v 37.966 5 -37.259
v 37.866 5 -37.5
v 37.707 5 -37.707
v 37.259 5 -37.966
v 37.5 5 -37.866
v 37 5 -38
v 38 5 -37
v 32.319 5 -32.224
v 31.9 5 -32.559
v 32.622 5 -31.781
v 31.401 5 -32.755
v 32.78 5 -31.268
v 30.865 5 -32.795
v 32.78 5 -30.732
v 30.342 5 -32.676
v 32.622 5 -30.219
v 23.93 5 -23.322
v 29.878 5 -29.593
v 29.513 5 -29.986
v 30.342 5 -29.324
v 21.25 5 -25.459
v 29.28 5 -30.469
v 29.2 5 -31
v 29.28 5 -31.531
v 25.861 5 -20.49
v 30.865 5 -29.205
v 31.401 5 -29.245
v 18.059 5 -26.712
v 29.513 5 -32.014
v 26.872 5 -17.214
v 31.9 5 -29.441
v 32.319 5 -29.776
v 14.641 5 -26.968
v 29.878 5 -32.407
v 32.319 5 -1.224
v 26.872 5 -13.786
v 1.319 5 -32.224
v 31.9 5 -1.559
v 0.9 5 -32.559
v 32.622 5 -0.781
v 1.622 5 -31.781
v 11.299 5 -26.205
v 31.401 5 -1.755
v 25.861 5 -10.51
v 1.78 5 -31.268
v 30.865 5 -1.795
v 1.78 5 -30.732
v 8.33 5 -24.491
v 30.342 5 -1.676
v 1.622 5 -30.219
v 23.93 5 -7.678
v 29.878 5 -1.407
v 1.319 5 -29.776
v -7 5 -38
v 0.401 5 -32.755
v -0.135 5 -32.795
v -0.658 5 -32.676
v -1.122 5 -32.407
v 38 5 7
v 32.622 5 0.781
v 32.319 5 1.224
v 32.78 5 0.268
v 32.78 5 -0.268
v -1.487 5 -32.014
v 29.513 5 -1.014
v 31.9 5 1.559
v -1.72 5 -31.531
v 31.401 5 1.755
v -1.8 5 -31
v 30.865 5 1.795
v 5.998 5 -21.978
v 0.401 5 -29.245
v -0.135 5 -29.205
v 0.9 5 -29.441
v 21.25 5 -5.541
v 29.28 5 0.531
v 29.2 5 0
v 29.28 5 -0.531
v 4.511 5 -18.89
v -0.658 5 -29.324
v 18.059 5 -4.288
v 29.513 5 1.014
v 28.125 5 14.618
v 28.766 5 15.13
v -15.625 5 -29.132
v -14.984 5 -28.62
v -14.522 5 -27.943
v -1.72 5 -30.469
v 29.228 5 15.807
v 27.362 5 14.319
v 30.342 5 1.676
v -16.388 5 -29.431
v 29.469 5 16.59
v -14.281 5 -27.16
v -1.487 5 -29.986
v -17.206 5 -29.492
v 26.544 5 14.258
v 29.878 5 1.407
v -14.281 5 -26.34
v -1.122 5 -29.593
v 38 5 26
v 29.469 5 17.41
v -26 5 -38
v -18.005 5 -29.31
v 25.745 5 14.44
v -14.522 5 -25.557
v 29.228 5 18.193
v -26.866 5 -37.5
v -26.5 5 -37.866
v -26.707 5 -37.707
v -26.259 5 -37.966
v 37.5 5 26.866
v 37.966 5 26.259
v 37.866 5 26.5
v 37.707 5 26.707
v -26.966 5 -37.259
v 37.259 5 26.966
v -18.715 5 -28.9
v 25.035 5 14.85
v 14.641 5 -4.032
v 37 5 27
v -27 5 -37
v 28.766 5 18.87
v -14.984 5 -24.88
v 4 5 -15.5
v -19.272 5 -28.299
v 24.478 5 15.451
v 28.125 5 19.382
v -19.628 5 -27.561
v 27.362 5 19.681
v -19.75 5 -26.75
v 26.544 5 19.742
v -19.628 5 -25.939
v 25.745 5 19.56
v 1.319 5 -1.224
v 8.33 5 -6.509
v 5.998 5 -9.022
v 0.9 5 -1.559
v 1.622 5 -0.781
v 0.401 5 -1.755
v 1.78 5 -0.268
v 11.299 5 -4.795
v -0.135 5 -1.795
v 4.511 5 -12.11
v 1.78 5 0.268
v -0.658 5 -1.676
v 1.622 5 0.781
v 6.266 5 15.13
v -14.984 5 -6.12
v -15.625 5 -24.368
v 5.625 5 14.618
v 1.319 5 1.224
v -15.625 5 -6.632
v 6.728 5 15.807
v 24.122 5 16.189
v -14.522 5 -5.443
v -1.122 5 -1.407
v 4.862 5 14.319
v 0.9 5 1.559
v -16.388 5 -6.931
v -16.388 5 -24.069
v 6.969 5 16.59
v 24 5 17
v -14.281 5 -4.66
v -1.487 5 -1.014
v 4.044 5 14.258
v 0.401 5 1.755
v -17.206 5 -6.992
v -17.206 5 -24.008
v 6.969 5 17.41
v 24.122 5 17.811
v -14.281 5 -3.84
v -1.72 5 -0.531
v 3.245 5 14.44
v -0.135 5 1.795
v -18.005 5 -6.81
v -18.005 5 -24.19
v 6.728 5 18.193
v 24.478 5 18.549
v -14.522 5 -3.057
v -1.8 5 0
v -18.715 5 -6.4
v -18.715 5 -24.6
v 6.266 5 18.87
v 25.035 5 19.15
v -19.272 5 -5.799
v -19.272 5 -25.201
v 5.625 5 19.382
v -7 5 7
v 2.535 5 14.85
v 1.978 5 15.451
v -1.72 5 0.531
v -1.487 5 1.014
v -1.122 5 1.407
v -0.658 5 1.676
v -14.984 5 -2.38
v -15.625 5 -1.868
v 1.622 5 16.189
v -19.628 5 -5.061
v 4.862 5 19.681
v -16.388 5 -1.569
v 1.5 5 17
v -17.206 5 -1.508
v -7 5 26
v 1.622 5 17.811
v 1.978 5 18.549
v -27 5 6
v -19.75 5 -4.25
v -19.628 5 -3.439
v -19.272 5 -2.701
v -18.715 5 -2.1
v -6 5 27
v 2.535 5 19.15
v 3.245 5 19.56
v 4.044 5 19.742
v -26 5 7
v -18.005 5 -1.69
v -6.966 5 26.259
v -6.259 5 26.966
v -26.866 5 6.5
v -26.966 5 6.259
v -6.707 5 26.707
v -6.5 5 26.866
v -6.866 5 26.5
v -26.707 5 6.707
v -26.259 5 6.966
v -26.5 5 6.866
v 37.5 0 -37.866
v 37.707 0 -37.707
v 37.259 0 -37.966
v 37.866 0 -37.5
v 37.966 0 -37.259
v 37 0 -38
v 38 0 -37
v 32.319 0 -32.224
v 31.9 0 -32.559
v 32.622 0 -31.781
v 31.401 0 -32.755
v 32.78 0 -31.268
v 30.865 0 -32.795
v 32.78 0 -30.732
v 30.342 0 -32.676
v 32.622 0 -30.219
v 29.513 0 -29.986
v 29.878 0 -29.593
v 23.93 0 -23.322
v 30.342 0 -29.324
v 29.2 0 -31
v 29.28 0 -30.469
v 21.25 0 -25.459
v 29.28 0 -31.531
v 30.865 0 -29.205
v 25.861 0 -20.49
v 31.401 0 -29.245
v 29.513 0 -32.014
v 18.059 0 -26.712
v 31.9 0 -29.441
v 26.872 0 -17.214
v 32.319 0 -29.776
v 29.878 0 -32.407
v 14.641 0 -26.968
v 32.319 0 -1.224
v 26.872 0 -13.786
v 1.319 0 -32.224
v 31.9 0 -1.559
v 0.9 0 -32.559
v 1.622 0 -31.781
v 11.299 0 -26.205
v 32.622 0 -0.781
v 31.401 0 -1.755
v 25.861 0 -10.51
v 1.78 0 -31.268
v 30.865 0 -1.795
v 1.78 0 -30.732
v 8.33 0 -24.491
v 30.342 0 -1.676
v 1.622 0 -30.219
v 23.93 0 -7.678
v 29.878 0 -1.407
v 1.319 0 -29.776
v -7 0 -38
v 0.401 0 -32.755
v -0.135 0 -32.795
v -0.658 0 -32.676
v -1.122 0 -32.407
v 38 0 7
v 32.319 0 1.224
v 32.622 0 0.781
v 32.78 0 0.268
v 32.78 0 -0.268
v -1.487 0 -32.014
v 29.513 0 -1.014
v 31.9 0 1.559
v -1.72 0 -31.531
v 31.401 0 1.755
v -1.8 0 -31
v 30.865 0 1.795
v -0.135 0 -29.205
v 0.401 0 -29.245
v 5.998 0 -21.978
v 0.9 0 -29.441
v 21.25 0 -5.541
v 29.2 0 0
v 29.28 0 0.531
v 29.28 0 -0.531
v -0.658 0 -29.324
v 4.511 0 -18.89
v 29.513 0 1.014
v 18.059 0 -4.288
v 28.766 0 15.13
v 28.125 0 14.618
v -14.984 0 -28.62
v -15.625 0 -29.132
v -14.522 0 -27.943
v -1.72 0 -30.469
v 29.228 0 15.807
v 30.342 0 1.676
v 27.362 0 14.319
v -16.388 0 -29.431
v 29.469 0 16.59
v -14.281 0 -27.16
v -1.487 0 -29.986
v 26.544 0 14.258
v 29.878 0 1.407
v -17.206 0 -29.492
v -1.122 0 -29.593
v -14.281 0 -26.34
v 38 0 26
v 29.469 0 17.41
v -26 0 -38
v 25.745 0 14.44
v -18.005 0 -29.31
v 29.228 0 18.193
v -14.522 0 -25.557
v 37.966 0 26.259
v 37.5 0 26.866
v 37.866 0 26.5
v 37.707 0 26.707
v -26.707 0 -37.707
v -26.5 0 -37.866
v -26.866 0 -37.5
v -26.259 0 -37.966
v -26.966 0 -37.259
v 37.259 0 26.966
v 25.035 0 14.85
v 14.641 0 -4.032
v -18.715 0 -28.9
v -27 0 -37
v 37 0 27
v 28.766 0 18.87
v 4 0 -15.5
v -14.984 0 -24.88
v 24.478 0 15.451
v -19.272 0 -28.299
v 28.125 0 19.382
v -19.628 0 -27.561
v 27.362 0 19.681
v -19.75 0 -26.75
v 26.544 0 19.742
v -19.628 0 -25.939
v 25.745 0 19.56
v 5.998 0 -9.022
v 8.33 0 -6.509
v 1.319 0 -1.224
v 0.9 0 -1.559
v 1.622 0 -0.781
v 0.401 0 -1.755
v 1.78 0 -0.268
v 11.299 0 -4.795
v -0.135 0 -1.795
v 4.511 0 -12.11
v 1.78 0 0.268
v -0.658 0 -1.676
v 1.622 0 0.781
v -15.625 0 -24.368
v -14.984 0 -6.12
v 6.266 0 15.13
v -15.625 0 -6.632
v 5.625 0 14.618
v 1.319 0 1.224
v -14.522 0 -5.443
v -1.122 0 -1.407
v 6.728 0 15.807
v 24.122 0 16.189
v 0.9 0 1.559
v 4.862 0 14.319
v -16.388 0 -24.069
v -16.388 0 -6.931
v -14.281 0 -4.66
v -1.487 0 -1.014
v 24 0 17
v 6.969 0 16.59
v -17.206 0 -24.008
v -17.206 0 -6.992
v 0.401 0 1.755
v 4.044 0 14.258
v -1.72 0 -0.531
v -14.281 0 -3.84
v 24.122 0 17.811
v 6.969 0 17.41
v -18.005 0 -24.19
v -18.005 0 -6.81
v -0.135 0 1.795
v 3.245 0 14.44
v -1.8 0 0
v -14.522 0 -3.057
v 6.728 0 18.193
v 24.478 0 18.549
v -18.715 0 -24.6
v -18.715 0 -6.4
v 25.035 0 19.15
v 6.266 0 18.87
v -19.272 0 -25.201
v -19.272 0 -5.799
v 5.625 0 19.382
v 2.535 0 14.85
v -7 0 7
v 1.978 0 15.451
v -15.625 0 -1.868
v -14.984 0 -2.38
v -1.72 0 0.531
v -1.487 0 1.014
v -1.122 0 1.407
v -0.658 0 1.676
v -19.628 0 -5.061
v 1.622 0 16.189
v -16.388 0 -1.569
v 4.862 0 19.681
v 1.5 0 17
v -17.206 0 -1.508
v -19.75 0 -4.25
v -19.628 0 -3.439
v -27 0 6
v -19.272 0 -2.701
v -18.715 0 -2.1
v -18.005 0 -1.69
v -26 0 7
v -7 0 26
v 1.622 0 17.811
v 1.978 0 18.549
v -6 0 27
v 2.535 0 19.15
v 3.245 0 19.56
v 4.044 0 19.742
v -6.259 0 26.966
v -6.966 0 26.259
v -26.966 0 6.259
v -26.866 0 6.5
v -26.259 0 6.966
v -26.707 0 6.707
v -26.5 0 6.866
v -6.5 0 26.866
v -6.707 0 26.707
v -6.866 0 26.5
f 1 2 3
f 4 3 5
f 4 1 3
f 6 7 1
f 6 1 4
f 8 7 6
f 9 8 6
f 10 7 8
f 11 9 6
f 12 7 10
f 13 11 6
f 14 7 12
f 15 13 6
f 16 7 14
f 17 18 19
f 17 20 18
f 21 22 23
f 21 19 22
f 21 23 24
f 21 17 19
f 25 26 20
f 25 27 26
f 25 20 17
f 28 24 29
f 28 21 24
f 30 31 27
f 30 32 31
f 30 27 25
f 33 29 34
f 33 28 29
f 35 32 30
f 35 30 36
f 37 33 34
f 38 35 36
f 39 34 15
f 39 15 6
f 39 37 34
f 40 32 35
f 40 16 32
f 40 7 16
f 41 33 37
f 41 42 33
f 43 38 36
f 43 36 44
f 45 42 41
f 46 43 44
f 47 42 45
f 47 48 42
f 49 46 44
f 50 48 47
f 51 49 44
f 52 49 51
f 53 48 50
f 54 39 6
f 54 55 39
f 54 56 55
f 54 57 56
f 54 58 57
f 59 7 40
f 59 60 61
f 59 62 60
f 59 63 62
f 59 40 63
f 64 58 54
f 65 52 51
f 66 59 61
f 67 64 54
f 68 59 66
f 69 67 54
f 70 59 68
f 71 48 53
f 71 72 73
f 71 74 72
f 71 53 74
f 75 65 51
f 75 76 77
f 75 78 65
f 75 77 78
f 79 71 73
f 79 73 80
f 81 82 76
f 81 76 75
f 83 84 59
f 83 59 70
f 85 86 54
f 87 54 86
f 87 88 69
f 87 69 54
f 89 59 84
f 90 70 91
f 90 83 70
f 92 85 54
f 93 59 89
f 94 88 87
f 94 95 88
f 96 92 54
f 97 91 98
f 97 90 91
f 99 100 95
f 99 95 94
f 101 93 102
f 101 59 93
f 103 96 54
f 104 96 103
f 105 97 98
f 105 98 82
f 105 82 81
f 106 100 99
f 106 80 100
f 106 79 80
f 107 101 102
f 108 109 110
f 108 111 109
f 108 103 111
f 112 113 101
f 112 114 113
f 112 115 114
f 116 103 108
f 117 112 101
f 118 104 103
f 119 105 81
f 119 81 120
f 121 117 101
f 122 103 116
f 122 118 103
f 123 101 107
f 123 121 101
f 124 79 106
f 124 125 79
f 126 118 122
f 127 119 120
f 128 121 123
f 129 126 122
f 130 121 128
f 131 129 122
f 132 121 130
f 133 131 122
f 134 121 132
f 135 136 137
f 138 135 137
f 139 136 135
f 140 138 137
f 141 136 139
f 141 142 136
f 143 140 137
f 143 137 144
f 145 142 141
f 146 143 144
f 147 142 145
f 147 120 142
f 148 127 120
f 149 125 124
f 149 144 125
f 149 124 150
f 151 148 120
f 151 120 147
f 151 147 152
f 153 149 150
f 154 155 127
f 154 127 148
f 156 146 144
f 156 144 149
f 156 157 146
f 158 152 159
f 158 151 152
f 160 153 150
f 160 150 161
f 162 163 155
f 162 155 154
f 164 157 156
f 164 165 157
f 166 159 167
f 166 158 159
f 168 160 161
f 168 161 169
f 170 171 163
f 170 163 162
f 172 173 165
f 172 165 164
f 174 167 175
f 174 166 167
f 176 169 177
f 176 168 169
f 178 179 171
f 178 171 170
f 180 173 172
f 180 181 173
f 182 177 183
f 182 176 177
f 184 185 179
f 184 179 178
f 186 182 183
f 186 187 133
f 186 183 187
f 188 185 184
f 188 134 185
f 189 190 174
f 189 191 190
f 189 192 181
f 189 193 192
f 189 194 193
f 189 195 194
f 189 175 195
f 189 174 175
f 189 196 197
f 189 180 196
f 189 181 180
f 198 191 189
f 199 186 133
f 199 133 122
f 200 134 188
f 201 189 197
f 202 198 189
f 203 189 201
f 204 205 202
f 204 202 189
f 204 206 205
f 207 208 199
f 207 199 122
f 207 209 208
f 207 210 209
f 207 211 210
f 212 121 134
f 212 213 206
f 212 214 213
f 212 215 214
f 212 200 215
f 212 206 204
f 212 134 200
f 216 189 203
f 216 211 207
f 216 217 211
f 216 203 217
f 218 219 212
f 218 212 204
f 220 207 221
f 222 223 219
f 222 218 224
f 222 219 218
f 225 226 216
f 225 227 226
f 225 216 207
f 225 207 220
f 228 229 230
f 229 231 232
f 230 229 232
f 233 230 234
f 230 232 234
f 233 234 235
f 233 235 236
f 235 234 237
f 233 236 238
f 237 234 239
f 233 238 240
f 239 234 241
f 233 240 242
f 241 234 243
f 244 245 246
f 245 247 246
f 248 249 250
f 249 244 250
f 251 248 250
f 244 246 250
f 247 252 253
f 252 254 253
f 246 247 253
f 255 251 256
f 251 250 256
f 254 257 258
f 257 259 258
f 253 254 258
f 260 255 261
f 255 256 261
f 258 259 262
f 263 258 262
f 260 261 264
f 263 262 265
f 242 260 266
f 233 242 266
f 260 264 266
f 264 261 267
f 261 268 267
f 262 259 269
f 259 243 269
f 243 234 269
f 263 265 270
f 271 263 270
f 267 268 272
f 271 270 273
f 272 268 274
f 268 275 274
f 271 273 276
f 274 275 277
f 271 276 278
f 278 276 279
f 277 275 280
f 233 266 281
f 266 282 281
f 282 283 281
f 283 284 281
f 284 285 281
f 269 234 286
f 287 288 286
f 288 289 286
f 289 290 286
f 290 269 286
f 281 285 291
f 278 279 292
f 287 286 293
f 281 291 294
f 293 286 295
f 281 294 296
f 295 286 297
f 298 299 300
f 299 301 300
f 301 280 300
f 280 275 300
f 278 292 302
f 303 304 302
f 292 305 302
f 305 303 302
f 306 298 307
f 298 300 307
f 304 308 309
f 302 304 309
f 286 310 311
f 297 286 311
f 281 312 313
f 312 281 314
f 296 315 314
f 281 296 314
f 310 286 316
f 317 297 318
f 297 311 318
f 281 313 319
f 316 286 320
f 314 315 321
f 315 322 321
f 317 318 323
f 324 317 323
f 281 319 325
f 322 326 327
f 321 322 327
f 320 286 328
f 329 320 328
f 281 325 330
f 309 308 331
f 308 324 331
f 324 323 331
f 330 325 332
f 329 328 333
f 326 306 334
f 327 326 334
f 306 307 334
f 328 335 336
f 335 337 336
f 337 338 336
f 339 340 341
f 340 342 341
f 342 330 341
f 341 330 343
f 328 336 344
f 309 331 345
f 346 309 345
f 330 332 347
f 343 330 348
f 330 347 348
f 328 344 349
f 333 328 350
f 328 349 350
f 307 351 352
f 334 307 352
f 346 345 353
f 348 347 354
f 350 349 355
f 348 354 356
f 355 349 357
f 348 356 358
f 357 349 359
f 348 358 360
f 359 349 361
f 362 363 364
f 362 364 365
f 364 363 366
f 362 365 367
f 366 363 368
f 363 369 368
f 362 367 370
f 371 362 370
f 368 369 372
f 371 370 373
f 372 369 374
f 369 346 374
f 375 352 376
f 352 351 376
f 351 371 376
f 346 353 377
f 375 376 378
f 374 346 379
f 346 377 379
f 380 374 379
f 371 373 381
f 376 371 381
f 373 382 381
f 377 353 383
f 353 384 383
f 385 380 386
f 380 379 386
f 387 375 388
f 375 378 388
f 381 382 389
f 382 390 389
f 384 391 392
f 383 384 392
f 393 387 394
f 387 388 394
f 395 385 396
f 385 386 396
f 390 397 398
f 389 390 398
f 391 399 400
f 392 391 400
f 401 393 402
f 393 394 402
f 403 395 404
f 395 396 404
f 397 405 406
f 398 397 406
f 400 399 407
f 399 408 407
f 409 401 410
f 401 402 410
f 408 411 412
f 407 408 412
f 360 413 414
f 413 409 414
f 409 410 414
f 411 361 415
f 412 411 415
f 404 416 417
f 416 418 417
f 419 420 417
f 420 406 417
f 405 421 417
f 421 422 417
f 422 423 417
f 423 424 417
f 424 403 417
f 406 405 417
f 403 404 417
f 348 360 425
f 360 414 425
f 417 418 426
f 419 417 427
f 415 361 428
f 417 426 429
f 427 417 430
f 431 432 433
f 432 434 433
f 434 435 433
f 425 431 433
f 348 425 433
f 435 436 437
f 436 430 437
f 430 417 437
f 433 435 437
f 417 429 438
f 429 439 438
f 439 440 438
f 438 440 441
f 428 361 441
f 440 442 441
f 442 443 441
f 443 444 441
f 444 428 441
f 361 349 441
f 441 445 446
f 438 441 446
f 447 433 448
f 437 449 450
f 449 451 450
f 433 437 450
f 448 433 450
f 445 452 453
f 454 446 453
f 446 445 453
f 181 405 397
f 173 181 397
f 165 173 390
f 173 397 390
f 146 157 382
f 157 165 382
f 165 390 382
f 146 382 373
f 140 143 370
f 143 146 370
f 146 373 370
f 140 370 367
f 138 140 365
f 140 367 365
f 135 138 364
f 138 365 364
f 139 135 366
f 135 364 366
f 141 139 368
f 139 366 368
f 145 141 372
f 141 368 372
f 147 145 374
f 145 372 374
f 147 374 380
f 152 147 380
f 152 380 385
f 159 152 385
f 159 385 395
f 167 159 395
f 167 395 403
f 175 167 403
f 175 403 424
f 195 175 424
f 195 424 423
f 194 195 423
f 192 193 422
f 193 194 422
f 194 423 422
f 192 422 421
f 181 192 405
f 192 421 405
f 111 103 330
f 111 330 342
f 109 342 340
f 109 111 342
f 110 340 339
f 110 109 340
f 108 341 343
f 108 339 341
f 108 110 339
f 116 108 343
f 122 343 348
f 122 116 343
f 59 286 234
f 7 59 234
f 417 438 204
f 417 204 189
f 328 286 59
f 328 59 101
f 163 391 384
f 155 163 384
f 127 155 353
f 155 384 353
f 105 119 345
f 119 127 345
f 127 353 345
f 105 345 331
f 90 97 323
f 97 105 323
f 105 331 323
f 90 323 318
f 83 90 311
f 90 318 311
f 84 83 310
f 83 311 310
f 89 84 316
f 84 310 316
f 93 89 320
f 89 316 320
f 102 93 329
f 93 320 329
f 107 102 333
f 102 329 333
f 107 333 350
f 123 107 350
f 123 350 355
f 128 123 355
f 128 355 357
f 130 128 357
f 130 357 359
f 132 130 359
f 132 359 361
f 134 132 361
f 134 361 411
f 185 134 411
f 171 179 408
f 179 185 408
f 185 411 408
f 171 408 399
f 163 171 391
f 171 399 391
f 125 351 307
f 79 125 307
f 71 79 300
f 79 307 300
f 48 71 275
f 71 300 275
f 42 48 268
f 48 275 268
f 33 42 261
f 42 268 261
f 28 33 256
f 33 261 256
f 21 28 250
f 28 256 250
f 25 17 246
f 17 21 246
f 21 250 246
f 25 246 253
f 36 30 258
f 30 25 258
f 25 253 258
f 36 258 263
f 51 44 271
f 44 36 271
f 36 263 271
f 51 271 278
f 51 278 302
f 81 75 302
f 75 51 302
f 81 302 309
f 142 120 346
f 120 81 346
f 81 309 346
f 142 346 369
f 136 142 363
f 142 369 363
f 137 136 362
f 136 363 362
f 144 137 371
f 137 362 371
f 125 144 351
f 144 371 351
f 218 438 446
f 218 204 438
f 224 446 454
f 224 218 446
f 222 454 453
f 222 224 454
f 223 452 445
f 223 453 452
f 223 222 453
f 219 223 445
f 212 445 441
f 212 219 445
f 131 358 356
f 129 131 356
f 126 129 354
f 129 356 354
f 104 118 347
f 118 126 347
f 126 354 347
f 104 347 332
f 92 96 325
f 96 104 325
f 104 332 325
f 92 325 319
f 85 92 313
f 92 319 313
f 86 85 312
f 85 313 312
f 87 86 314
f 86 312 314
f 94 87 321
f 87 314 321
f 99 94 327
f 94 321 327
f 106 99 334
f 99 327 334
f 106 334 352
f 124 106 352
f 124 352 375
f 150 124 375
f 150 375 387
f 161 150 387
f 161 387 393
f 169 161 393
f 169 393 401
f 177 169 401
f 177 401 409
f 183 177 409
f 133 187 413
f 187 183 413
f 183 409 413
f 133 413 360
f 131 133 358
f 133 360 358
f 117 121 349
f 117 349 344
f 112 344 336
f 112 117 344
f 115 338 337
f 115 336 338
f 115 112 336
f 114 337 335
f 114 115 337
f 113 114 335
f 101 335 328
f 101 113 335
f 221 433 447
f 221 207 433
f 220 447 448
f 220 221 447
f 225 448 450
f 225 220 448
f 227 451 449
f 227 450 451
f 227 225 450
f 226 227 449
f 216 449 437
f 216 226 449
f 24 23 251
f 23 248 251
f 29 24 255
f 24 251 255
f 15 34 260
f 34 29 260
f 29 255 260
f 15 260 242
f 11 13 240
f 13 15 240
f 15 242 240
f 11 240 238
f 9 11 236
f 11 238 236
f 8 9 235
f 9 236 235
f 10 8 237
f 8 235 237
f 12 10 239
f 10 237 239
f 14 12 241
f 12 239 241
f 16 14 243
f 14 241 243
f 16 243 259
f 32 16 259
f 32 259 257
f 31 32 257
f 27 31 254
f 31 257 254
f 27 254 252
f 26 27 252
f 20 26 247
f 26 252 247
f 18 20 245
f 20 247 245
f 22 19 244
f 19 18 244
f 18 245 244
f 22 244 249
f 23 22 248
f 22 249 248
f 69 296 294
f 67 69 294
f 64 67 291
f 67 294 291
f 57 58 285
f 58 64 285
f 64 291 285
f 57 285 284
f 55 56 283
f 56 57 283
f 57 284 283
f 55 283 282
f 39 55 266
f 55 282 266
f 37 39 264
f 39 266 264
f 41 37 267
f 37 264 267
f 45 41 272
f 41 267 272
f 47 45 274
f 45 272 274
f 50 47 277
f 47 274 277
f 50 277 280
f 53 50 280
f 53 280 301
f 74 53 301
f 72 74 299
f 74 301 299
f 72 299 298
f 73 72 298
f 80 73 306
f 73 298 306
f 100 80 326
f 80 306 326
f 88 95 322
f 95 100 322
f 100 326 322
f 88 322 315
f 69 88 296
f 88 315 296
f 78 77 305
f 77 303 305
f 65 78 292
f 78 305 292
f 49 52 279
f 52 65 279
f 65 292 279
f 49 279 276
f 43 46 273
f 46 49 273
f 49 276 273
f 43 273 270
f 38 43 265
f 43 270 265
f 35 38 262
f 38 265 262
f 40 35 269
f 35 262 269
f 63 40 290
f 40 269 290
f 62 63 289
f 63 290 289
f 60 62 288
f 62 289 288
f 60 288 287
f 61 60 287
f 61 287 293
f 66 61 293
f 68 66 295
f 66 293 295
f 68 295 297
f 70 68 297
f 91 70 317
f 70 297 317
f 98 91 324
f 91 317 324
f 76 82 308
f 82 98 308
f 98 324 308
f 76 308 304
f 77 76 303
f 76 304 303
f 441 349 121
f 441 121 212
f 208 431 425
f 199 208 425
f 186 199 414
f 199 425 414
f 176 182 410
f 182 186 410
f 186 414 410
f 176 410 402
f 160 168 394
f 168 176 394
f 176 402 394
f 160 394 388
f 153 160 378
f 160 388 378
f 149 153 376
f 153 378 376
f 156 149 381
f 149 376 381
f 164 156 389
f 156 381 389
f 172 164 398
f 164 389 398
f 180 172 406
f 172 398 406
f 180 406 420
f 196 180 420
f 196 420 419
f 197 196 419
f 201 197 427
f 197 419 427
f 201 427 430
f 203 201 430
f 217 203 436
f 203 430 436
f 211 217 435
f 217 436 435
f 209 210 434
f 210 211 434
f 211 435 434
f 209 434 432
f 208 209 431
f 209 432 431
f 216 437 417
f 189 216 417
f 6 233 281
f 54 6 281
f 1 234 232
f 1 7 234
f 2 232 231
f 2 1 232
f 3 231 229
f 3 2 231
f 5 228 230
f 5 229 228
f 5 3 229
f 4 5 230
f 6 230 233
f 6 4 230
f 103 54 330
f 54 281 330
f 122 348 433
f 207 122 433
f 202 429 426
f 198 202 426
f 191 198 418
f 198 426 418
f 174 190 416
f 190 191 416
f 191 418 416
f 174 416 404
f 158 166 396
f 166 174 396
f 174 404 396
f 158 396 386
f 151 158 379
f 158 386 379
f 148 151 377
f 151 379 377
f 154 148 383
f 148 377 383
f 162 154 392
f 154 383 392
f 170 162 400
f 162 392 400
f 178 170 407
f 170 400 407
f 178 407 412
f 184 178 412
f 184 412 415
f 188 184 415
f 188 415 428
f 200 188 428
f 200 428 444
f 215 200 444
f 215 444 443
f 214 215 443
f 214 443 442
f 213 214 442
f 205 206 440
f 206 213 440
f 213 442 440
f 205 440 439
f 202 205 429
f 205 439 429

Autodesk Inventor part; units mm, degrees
ref_plane "YZ Plane" through (0, 0, 0) normal (1, 0, 0) x (0, 1, 0)
ref_plane "XZ Plane" through (0, 0, 0) normal (0, 1, 0) x (-1, 0, 0)
ref_plane "XY Plane" through (0, 0, 0) normal (0, 0, 1) x (1, 0, 0)
sketch "Sketch1" plane through (0, 0, 0) normal (0, 1, 0) x (-1, 0, 0)
  line L0 (0, 0) -> (-31, 0) construction
  line L1 (-31, 0) -> (-31, -31) construction
  line L2 (-31, -31) -> (0, -31) construction
  line L3 (0, -31) -> (0, 0) construction
  circle A0 centre (0, 0) radius 1.8
  circle A1 centre (0, -31) radius 1.8
  circle A2 centre (-31, -31) radius 1.8
  circle A3 centre (-31, 0) radius 1.8
  line L4 (-38, 7) -> (-38, -38)
  line L5 (-38, -38) -> (7, -38)
  line L6 (7, -38) -> (27, -38)
  line L7 (27, -38) -> (27, 7)
  line L8 (27, 7) -> (7, 7)
  line L9 (-38, 7) -> (-38, 27)
  line L10 (-38, 27) -> (7, 27)
  line L11 (7, 27) -> (7, 7)
  line L12 (7, 7) -> (-38, -38) construction
  line L13 (-38, 7) -> (7, -38) construction
  line L14 (17, 7) -> (17, -15.5) construction
  line L15 (7, 17) -> (-15.5, 17) construction
  line L16 (-15.5, 27) -> (-15.5, 17) construction
  line L17 (-15.5, 17) -> (-38, 17) construction
  line L18 (27, -15.5) -> (17, -15.5) construction
  line L19 (17, -15.5) -> (17, -38) construction
  circle A4 centre (17, -4.25) radius 2.75
  circle A5 centre (17, -26.75) radius 2.75
  circle A6 centre (-26.75, 17) radius 2.75
  circle A7 centre (-4.25, 17) radius 2.75
  circle A8 centre (-15.5, -15.5) radius 11.5
  dimension "d0" = 31
  dimension "d1" = 31
  dimension "d2" = 3.6
  dimension "d3" = 3.6
  dimension "d4" = 3.6
  dimension "d5" = 3.6
  dimension "d6" = 45
  dimension "d7" = 45
  dimension "d8" = 20
  dimension "d9" = 20
  dimension "d10" = 5.5
  dimension "d11" = 5.5
  dimension "d12" = 5.5
  dimension "d13" = 5.5
  dimension "d17" = 23
extrude "Extrusion1" add sketch "Sketch1" along normal blind 5
fillet "Fillet1" radius 1 5 edges at (-27, 2.5, 7) (-7, 2.5, 27) (38, 2.5, 27) (38, 2.5, -38) (-27, 2.5, -38)
equation "\"d3\" = d2"
equation "\"d4\" = d2"
equation "\"d5\" = d2"
equation "\"d11\" = d10"
equation "\"d12\" = d10"
equation "\"d13\" = d10"
properties part number "NEMA17 Stepper CornerMount" material "PC/ABS Plastic"
